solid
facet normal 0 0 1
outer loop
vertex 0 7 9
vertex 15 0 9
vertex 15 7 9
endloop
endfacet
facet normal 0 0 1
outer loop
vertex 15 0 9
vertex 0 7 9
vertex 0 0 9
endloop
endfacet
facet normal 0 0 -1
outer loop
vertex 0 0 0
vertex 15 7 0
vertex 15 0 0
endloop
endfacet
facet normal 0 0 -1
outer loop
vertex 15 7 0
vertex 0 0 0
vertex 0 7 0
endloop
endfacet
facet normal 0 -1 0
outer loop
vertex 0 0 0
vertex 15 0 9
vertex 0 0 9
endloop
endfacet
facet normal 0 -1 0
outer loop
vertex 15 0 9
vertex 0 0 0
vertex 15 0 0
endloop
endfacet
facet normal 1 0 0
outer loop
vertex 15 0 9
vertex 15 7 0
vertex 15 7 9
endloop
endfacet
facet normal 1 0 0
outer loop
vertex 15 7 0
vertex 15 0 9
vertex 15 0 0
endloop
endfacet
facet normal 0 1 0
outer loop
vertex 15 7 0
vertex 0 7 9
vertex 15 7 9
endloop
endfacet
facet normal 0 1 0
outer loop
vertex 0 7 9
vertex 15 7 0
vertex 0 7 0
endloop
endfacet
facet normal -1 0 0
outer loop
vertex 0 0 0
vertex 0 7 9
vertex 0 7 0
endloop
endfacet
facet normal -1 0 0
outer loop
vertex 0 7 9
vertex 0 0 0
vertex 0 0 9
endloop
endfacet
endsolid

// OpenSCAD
// Generated by SolidPython 1.0.1 on 2020-07-29 00:46:55


cube(size = [15, 7, 9]);
/***********************************************
*********      SolidPython code:      **********
************************************************
 
# import packages: SolidPython
from solid import *
from solid.utils import *
from itertools import chain, combinations, permutations


class Resize:

    def __init__(self, scad_file):
        self.scad_file = scad_file
        #self.scad_file = import_scad(scad_file)
        # cone/cylinder param:
        self.r1 = 0
        self.r2 = 0
        self.h = 0
        # rectangular prism param:
        self.w = 0
        self.l = 0
        # ellipse param:
        self.r = 0

    # import OpenScad code (file name corresponds to shape)


    # classify shape + parameters
    def assign(self, param1, param2, param3):
        if self.scad_file == 'cone.scad':
            self.r1 = param1
            self.r2 = param2
            self.h = param3
        elif self.scad_file == 'cylinder.scad':
            self.r1 = param1
            self.r2 = param2
            self.h = param3
        elif self.scad_file == 'rectangularPrism.scad':
            self.h = param1
            self.l = param2
            self.w = param3
        else:
            self.r = param1
            self.h = param2

    # resize parameters
    def iterate(self):
        x = range(3, 20, 2)
        i = 1
        if self.scad_file == 'cone.scad':
            tempList = list(permutations(x, 2))
            for temp in tempList:
                param1 = temp[0]
                param2 = temp[1]
                filepath = 'produced_scad_files/' + 'cone' + str(param1) + '_' + str(param2) + '_' + '.scad'
                scad_render_to_file(cylinder(h=param1, r1=param2, r2=0), filepath)

        elif self.scad_file == 'cylinder.scad':
            tempList = list(permutations(x, 3))
            for temp in tempList:
                param1 = temp[0]
                param2 = temp[1]
                filepath = 'produced_scad_files/' + 'cylinder' + str(param1) + '_' + str(param2) + '_' + '.scad'
                scad_render_to_file(cylinder(h=param1, r1=param2, r2=param2), filepath)

        elif self.scad_file == 'rectangularPrism.scad':
            tempList = list(permutations(x, 3))
            for temp in tempList:
                param1 = temp[0]
                param2 = temp[1]
                param3 = temp[2]
                filepath = 'produced_scad_files/' + 'rectangularPrism' + str(param1) + '_' + str(param2) + '_' + str(
                    param3) + '.scad'
                scad_render_to_file(cube(size=(param1, param2, param3)), filepath)

        elif self.scad_file == 'ellipse.scad':
            tempList = list(permutations(x, 4))
            for temp in tempList:
                param1 = temp[0]
                param2 = temp[1]
                param3 = temp[2]
                param4 = temp[3]
                filepath = 'produced_scad_files/' + 'ellipse' + str(param1) + '_' + str(param2) + '_' + str(param3) + '_' + str(param4) + '.scad'
                scad_render_to_file(scale([param1, param2, param3])(sphere(r=param4)), filepath)

    def render_to_scadfile(self):
        scad_render_to_file(scad, 'example.scad') 
 
************************************************/
